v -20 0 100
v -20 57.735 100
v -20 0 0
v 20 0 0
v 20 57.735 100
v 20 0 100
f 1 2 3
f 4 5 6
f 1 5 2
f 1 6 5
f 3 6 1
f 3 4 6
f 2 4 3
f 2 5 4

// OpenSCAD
translate([-20.0,0.0,100.0])scale([1.0,1.0,1.0])rotate([0.0,0.0,0.0])  rotate([90.0,90.0,90.0])  linear_extrude(height =40.0)  polygon(
points = [[0.0,0.0],[100.0,0.0],[0.0,57.735026918962575]]);
